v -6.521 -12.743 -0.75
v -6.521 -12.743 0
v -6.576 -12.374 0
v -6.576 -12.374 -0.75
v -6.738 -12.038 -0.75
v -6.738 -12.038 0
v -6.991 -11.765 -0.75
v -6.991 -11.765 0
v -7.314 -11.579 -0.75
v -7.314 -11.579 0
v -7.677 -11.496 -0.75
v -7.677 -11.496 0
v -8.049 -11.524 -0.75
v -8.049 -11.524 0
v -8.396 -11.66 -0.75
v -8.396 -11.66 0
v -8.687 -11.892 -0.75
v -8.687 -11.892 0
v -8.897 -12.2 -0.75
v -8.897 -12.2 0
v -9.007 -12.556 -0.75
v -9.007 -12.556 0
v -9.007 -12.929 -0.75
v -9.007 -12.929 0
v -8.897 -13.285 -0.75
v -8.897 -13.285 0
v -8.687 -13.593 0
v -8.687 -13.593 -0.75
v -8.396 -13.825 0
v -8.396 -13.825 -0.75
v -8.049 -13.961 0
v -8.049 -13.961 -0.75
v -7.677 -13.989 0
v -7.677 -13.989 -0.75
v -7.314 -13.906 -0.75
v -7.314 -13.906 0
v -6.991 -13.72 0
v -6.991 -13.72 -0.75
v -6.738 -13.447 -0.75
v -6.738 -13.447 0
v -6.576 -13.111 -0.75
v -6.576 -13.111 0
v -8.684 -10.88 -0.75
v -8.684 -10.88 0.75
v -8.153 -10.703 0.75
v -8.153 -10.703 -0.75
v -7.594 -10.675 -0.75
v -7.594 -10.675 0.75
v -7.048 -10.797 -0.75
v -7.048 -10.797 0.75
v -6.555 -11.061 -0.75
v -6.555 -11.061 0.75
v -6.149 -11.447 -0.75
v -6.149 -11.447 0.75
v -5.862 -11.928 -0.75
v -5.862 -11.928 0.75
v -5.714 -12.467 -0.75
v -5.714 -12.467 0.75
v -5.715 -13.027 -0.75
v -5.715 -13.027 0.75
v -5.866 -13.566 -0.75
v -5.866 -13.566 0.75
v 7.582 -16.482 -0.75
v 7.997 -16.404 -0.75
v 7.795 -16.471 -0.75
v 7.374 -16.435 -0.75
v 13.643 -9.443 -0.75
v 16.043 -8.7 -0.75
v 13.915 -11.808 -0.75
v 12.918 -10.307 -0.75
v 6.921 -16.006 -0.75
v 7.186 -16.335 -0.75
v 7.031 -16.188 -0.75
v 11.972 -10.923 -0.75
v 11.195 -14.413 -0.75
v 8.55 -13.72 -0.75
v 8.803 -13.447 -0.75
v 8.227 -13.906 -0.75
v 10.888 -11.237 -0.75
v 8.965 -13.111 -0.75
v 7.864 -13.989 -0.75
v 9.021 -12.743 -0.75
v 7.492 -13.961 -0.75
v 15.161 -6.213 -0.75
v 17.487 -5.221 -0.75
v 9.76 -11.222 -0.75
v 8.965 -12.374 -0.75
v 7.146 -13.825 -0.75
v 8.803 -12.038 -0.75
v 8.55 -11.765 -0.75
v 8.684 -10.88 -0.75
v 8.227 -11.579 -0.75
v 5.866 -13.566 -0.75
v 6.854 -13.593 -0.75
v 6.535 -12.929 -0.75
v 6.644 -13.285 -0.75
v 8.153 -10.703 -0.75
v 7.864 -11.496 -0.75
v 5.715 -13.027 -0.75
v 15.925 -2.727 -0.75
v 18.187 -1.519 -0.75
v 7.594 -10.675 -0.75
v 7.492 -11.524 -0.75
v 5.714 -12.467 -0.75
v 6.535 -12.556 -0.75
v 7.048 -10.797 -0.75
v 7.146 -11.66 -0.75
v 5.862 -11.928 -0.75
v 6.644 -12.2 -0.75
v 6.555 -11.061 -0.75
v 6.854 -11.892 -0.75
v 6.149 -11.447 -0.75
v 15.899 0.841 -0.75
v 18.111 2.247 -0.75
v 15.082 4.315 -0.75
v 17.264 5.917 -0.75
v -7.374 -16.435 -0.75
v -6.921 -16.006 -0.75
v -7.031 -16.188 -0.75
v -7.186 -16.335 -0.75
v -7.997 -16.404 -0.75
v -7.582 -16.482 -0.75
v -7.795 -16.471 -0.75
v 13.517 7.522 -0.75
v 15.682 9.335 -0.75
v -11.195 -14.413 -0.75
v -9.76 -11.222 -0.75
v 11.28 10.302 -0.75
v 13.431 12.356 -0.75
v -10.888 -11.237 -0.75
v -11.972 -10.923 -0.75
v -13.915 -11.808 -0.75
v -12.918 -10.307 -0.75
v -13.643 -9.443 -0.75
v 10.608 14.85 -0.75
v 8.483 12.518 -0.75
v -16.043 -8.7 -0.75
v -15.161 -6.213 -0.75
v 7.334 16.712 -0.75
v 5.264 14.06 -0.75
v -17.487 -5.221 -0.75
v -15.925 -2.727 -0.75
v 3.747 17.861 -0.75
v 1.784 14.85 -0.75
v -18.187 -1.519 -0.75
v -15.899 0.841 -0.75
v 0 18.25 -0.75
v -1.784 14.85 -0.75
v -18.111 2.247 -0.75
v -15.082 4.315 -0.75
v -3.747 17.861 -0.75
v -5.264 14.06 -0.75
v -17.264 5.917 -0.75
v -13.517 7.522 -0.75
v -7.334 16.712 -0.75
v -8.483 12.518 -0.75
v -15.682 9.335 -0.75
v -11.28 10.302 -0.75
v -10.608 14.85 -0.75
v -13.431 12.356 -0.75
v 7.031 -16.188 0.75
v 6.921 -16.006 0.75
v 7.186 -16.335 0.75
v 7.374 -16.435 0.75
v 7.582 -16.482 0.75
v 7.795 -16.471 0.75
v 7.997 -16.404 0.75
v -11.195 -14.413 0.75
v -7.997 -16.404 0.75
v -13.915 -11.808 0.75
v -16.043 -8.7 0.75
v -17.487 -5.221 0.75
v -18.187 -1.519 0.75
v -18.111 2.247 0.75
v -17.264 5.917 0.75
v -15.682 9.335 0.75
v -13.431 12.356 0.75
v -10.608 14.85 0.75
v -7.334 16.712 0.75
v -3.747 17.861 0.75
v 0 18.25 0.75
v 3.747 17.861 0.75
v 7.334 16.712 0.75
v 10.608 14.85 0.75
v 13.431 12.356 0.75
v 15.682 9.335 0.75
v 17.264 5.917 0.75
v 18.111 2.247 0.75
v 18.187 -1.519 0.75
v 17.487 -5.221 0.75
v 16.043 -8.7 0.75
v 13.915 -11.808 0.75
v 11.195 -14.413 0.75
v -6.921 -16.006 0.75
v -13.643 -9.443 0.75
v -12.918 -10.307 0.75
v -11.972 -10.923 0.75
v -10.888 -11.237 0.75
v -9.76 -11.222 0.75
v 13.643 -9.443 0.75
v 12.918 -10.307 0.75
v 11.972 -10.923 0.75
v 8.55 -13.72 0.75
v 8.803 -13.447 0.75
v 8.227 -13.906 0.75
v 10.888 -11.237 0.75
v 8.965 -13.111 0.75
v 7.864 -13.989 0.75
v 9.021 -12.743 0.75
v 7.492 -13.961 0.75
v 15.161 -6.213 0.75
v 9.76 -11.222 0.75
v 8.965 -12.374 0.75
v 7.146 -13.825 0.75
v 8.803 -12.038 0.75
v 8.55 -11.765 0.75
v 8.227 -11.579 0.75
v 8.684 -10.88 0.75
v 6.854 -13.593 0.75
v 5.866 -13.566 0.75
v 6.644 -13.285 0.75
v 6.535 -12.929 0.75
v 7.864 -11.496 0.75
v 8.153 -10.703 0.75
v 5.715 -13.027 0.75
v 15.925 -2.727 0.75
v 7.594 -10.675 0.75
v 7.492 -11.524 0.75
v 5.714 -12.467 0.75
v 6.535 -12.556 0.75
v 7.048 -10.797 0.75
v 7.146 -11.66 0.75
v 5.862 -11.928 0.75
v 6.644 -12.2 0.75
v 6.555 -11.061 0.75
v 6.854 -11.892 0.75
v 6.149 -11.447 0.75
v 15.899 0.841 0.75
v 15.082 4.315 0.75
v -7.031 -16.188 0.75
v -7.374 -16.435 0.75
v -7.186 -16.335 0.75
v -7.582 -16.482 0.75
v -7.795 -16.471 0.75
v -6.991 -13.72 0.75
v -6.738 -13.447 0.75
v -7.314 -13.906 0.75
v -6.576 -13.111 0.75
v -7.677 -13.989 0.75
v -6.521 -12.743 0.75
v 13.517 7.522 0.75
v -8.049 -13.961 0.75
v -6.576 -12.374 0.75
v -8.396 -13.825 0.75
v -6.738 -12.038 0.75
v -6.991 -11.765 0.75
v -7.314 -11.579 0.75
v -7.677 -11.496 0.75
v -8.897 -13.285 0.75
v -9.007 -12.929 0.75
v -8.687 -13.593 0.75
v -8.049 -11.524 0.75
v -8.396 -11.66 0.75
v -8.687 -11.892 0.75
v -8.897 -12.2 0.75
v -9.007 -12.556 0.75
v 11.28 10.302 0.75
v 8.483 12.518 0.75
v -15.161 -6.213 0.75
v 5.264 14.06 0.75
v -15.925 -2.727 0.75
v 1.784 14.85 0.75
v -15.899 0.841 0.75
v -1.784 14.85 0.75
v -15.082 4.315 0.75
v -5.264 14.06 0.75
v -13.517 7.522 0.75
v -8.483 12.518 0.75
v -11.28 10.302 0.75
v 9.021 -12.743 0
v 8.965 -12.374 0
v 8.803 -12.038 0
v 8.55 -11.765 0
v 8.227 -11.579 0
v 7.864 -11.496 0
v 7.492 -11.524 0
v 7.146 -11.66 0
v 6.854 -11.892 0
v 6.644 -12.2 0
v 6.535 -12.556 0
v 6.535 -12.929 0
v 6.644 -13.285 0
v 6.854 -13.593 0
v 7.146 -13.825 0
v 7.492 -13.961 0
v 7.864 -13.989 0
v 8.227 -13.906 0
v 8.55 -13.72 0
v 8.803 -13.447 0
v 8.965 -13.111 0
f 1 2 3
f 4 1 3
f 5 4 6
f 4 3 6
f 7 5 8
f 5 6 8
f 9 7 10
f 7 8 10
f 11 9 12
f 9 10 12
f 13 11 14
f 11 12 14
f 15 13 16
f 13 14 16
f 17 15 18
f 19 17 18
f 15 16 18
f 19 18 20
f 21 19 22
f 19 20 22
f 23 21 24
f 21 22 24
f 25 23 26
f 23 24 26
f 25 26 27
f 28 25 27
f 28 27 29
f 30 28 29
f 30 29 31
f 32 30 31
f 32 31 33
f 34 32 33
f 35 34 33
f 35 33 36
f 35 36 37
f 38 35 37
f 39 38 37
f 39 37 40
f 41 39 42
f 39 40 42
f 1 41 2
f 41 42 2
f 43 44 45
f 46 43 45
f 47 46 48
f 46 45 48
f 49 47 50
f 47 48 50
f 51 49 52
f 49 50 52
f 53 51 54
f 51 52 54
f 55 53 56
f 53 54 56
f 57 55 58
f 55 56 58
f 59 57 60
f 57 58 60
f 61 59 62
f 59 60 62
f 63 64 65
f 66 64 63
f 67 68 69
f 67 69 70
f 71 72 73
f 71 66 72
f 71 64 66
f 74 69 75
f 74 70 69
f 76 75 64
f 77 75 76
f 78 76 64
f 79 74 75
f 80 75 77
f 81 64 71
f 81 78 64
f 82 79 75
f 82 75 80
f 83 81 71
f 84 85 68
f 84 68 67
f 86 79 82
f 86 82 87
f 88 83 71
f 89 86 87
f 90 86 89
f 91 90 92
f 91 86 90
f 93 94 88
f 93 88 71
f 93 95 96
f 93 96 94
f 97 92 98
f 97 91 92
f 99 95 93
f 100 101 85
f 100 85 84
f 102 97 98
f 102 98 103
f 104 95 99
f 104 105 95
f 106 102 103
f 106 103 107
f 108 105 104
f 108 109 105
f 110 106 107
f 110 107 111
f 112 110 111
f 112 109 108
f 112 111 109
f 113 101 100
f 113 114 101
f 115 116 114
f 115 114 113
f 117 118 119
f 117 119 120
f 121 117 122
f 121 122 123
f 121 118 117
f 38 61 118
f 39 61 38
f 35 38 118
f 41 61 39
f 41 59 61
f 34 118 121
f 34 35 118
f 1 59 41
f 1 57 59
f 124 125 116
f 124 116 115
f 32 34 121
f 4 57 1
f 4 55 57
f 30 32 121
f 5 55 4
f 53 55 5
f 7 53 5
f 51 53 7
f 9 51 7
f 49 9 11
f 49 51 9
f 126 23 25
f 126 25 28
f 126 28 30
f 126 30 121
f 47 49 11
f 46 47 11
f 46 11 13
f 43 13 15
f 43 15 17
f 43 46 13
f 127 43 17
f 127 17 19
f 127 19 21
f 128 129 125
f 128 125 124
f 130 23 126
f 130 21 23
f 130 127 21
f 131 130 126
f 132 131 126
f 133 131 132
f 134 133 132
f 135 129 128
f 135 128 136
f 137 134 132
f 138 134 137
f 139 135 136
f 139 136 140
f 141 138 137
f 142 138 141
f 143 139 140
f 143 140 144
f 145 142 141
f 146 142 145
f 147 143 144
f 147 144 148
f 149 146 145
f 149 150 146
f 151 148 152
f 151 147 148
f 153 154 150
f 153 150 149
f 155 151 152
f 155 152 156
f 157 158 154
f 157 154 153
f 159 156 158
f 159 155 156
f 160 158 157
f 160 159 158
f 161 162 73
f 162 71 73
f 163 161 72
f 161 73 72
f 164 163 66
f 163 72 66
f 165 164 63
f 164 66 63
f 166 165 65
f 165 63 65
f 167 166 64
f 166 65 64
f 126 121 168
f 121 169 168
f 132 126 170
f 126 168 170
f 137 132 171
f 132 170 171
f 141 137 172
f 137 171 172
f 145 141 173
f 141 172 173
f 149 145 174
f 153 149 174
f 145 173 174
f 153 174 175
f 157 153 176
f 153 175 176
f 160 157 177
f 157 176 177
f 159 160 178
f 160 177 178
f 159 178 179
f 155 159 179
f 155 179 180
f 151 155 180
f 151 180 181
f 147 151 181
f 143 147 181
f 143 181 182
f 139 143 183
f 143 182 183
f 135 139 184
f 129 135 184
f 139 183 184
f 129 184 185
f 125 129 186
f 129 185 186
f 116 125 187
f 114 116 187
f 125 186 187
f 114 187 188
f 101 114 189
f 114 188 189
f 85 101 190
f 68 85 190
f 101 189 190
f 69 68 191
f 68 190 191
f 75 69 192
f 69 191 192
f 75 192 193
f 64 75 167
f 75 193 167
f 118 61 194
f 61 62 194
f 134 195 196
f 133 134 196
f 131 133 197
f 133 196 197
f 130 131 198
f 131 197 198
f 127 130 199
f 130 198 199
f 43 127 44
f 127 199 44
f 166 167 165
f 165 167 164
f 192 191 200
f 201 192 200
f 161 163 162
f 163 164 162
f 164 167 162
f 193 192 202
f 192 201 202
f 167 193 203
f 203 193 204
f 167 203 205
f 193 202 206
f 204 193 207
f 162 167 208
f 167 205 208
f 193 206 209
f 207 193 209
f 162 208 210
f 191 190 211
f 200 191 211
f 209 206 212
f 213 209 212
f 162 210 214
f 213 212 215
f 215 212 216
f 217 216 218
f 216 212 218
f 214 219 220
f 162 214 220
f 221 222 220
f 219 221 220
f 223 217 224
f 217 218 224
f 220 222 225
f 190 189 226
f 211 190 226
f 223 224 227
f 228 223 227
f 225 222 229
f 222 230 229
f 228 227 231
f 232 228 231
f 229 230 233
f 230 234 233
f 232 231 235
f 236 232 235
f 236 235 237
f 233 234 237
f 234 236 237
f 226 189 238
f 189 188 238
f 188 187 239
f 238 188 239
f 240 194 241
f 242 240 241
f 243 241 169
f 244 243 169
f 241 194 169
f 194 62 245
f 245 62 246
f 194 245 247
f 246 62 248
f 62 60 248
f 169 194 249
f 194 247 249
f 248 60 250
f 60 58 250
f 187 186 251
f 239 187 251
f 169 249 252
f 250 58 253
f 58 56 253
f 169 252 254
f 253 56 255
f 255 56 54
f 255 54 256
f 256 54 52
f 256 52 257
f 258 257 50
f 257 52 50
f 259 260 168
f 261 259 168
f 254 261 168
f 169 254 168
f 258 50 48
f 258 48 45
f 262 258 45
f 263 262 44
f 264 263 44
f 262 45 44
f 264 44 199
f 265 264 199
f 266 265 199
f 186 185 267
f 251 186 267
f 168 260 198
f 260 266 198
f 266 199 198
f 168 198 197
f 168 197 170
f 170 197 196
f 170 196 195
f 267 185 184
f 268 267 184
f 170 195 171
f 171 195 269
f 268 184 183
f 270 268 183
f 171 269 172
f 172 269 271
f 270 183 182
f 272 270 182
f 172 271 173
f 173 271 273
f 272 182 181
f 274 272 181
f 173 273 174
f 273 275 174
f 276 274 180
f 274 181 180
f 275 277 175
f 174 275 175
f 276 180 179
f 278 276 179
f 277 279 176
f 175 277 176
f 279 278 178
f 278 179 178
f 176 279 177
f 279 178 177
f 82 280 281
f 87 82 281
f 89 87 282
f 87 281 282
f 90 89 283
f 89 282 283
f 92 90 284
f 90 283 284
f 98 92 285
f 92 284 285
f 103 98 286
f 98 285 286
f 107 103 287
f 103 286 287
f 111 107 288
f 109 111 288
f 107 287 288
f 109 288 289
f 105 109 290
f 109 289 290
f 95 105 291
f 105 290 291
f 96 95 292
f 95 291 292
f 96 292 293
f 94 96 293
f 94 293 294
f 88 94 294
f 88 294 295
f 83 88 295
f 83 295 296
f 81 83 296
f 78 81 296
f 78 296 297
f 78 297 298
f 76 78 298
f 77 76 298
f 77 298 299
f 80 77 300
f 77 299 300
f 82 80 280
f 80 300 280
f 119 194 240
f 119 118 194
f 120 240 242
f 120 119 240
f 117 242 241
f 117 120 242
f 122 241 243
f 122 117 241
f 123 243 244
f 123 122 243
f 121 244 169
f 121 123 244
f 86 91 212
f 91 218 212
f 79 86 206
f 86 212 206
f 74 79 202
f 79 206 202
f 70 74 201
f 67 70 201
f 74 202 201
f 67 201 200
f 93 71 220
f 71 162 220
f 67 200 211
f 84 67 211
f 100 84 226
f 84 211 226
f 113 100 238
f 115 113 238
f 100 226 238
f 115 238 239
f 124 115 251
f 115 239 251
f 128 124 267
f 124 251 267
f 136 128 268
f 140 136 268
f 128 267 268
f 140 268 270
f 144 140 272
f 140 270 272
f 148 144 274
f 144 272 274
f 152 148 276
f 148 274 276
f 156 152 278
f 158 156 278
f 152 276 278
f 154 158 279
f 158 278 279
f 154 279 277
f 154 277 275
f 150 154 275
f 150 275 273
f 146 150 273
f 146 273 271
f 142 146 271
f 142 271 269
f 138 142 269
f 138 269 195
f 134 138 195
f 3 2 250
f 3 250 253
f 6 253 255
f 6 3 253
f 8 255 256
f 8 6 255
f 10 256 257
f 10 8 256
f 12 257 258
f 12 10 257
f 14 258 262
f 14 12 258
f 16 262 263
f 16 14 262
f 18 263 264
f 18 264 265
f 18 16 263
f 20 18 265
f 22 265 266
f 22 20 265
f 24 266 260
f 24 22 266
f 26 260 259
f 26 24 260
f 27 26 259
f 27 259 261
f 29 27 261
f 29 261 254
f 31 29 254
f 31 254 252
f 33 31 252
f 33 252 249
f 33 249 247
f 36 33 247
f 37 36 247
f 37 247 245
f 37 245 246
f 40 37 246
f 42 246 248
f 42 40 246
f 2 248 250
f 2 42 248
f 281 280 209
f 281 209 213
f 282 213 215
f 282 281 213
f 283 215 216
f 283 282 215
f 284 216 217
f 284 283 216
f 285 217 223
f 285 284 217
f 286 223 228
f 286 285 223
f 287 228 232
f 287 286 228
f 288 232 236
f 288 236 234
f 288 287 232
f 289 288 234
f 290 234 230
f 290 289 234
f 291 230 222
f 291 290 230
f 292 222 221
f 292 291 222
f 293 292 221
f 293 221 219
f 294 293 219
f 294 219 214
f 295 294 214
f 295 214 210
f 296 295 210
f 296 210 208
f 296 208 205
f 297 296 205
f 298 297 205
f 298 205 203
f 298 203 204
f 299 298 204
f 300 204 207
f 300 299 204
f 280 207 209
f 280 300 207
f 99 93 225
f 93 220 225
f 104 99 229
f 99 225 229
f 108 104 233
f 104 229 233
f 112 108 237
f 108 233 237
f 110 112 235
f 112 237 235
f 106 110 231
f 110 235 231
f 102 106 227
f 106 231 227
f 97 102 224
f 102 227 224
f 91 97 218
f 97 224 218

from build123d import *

# Parameters (mm, degrees)
SKETCH3_R                = 1.25
BOSS_EXTRUDE1_DEPTH      = 0.75
BOSS_EXTRUDE1_DEPTH_BACK = 0.75
FILLET1_R                = 0.79375


with BuildPart() as part:
    # Sketch3 → Boss-Extrude1 (new body, two sides)
    with BuildSketch(Plane.XY) as boss_extrude1_sk:
        with BuildLine():
            Line((-5.8660137, -13.566130003), (-7.243190661, -16.751080235))
            ThreePointArc((-7.243190661, -16.751080235), (0, 18.25), (7.243190661, -16.751080235))
            Line((7.243190661, -16.751080235), (5.8660137, -13.566130003))
            ThreePointArc((5.8660137, -13.566130003), (6.338884196, -11.240641223), (8.684339918, -10.879612098))
            ThreePointArc((8.684339918, -10.879612098), (11.441621609, -11.12015326), (13.643394773, -9.443055377))
            ThreePointArc((13.643394773, -9.443055377), (0, 14.95), (-13.643394773, -9.443055377))
            ThreePointArc((-13.643394773, -9.443055377), (-11.441621609, -11.12015326), (-8.684339918, -10.879612098))
            ThreePointArc((-8.684339918, -10.879612098), (-6.338884196, -11.240641223), (-5.8660137, -13.566130003))
        make_face()
        with Locations((-7.770588576, -12.742589147)):
            Circle(SKETCH3_R, mode=Mode.SUBTRACT)
        with Locations((7.770588576, -12.742589147)):
            Circle(SKETCH3_R, mode=Mode.SUBTRACT)
    extrude(amount=BOSS_EXTRUDE1_DEPTH)
    extrude(boss_extrude1_sk.sketch, amount=-BOSS_EXTRUDE1_DEPTH_BACK)

    # Fillet1
    fillet1_edges = [part.edges().sort_by_distance(p)[0] for p in [
        (7.243190661, -16.751080235, 0),
        (-7.243190661, -16.751080235, 0),
    ]]
    fillet(fillet1_edges, radius=FILLET1_R)


solid = part.part
